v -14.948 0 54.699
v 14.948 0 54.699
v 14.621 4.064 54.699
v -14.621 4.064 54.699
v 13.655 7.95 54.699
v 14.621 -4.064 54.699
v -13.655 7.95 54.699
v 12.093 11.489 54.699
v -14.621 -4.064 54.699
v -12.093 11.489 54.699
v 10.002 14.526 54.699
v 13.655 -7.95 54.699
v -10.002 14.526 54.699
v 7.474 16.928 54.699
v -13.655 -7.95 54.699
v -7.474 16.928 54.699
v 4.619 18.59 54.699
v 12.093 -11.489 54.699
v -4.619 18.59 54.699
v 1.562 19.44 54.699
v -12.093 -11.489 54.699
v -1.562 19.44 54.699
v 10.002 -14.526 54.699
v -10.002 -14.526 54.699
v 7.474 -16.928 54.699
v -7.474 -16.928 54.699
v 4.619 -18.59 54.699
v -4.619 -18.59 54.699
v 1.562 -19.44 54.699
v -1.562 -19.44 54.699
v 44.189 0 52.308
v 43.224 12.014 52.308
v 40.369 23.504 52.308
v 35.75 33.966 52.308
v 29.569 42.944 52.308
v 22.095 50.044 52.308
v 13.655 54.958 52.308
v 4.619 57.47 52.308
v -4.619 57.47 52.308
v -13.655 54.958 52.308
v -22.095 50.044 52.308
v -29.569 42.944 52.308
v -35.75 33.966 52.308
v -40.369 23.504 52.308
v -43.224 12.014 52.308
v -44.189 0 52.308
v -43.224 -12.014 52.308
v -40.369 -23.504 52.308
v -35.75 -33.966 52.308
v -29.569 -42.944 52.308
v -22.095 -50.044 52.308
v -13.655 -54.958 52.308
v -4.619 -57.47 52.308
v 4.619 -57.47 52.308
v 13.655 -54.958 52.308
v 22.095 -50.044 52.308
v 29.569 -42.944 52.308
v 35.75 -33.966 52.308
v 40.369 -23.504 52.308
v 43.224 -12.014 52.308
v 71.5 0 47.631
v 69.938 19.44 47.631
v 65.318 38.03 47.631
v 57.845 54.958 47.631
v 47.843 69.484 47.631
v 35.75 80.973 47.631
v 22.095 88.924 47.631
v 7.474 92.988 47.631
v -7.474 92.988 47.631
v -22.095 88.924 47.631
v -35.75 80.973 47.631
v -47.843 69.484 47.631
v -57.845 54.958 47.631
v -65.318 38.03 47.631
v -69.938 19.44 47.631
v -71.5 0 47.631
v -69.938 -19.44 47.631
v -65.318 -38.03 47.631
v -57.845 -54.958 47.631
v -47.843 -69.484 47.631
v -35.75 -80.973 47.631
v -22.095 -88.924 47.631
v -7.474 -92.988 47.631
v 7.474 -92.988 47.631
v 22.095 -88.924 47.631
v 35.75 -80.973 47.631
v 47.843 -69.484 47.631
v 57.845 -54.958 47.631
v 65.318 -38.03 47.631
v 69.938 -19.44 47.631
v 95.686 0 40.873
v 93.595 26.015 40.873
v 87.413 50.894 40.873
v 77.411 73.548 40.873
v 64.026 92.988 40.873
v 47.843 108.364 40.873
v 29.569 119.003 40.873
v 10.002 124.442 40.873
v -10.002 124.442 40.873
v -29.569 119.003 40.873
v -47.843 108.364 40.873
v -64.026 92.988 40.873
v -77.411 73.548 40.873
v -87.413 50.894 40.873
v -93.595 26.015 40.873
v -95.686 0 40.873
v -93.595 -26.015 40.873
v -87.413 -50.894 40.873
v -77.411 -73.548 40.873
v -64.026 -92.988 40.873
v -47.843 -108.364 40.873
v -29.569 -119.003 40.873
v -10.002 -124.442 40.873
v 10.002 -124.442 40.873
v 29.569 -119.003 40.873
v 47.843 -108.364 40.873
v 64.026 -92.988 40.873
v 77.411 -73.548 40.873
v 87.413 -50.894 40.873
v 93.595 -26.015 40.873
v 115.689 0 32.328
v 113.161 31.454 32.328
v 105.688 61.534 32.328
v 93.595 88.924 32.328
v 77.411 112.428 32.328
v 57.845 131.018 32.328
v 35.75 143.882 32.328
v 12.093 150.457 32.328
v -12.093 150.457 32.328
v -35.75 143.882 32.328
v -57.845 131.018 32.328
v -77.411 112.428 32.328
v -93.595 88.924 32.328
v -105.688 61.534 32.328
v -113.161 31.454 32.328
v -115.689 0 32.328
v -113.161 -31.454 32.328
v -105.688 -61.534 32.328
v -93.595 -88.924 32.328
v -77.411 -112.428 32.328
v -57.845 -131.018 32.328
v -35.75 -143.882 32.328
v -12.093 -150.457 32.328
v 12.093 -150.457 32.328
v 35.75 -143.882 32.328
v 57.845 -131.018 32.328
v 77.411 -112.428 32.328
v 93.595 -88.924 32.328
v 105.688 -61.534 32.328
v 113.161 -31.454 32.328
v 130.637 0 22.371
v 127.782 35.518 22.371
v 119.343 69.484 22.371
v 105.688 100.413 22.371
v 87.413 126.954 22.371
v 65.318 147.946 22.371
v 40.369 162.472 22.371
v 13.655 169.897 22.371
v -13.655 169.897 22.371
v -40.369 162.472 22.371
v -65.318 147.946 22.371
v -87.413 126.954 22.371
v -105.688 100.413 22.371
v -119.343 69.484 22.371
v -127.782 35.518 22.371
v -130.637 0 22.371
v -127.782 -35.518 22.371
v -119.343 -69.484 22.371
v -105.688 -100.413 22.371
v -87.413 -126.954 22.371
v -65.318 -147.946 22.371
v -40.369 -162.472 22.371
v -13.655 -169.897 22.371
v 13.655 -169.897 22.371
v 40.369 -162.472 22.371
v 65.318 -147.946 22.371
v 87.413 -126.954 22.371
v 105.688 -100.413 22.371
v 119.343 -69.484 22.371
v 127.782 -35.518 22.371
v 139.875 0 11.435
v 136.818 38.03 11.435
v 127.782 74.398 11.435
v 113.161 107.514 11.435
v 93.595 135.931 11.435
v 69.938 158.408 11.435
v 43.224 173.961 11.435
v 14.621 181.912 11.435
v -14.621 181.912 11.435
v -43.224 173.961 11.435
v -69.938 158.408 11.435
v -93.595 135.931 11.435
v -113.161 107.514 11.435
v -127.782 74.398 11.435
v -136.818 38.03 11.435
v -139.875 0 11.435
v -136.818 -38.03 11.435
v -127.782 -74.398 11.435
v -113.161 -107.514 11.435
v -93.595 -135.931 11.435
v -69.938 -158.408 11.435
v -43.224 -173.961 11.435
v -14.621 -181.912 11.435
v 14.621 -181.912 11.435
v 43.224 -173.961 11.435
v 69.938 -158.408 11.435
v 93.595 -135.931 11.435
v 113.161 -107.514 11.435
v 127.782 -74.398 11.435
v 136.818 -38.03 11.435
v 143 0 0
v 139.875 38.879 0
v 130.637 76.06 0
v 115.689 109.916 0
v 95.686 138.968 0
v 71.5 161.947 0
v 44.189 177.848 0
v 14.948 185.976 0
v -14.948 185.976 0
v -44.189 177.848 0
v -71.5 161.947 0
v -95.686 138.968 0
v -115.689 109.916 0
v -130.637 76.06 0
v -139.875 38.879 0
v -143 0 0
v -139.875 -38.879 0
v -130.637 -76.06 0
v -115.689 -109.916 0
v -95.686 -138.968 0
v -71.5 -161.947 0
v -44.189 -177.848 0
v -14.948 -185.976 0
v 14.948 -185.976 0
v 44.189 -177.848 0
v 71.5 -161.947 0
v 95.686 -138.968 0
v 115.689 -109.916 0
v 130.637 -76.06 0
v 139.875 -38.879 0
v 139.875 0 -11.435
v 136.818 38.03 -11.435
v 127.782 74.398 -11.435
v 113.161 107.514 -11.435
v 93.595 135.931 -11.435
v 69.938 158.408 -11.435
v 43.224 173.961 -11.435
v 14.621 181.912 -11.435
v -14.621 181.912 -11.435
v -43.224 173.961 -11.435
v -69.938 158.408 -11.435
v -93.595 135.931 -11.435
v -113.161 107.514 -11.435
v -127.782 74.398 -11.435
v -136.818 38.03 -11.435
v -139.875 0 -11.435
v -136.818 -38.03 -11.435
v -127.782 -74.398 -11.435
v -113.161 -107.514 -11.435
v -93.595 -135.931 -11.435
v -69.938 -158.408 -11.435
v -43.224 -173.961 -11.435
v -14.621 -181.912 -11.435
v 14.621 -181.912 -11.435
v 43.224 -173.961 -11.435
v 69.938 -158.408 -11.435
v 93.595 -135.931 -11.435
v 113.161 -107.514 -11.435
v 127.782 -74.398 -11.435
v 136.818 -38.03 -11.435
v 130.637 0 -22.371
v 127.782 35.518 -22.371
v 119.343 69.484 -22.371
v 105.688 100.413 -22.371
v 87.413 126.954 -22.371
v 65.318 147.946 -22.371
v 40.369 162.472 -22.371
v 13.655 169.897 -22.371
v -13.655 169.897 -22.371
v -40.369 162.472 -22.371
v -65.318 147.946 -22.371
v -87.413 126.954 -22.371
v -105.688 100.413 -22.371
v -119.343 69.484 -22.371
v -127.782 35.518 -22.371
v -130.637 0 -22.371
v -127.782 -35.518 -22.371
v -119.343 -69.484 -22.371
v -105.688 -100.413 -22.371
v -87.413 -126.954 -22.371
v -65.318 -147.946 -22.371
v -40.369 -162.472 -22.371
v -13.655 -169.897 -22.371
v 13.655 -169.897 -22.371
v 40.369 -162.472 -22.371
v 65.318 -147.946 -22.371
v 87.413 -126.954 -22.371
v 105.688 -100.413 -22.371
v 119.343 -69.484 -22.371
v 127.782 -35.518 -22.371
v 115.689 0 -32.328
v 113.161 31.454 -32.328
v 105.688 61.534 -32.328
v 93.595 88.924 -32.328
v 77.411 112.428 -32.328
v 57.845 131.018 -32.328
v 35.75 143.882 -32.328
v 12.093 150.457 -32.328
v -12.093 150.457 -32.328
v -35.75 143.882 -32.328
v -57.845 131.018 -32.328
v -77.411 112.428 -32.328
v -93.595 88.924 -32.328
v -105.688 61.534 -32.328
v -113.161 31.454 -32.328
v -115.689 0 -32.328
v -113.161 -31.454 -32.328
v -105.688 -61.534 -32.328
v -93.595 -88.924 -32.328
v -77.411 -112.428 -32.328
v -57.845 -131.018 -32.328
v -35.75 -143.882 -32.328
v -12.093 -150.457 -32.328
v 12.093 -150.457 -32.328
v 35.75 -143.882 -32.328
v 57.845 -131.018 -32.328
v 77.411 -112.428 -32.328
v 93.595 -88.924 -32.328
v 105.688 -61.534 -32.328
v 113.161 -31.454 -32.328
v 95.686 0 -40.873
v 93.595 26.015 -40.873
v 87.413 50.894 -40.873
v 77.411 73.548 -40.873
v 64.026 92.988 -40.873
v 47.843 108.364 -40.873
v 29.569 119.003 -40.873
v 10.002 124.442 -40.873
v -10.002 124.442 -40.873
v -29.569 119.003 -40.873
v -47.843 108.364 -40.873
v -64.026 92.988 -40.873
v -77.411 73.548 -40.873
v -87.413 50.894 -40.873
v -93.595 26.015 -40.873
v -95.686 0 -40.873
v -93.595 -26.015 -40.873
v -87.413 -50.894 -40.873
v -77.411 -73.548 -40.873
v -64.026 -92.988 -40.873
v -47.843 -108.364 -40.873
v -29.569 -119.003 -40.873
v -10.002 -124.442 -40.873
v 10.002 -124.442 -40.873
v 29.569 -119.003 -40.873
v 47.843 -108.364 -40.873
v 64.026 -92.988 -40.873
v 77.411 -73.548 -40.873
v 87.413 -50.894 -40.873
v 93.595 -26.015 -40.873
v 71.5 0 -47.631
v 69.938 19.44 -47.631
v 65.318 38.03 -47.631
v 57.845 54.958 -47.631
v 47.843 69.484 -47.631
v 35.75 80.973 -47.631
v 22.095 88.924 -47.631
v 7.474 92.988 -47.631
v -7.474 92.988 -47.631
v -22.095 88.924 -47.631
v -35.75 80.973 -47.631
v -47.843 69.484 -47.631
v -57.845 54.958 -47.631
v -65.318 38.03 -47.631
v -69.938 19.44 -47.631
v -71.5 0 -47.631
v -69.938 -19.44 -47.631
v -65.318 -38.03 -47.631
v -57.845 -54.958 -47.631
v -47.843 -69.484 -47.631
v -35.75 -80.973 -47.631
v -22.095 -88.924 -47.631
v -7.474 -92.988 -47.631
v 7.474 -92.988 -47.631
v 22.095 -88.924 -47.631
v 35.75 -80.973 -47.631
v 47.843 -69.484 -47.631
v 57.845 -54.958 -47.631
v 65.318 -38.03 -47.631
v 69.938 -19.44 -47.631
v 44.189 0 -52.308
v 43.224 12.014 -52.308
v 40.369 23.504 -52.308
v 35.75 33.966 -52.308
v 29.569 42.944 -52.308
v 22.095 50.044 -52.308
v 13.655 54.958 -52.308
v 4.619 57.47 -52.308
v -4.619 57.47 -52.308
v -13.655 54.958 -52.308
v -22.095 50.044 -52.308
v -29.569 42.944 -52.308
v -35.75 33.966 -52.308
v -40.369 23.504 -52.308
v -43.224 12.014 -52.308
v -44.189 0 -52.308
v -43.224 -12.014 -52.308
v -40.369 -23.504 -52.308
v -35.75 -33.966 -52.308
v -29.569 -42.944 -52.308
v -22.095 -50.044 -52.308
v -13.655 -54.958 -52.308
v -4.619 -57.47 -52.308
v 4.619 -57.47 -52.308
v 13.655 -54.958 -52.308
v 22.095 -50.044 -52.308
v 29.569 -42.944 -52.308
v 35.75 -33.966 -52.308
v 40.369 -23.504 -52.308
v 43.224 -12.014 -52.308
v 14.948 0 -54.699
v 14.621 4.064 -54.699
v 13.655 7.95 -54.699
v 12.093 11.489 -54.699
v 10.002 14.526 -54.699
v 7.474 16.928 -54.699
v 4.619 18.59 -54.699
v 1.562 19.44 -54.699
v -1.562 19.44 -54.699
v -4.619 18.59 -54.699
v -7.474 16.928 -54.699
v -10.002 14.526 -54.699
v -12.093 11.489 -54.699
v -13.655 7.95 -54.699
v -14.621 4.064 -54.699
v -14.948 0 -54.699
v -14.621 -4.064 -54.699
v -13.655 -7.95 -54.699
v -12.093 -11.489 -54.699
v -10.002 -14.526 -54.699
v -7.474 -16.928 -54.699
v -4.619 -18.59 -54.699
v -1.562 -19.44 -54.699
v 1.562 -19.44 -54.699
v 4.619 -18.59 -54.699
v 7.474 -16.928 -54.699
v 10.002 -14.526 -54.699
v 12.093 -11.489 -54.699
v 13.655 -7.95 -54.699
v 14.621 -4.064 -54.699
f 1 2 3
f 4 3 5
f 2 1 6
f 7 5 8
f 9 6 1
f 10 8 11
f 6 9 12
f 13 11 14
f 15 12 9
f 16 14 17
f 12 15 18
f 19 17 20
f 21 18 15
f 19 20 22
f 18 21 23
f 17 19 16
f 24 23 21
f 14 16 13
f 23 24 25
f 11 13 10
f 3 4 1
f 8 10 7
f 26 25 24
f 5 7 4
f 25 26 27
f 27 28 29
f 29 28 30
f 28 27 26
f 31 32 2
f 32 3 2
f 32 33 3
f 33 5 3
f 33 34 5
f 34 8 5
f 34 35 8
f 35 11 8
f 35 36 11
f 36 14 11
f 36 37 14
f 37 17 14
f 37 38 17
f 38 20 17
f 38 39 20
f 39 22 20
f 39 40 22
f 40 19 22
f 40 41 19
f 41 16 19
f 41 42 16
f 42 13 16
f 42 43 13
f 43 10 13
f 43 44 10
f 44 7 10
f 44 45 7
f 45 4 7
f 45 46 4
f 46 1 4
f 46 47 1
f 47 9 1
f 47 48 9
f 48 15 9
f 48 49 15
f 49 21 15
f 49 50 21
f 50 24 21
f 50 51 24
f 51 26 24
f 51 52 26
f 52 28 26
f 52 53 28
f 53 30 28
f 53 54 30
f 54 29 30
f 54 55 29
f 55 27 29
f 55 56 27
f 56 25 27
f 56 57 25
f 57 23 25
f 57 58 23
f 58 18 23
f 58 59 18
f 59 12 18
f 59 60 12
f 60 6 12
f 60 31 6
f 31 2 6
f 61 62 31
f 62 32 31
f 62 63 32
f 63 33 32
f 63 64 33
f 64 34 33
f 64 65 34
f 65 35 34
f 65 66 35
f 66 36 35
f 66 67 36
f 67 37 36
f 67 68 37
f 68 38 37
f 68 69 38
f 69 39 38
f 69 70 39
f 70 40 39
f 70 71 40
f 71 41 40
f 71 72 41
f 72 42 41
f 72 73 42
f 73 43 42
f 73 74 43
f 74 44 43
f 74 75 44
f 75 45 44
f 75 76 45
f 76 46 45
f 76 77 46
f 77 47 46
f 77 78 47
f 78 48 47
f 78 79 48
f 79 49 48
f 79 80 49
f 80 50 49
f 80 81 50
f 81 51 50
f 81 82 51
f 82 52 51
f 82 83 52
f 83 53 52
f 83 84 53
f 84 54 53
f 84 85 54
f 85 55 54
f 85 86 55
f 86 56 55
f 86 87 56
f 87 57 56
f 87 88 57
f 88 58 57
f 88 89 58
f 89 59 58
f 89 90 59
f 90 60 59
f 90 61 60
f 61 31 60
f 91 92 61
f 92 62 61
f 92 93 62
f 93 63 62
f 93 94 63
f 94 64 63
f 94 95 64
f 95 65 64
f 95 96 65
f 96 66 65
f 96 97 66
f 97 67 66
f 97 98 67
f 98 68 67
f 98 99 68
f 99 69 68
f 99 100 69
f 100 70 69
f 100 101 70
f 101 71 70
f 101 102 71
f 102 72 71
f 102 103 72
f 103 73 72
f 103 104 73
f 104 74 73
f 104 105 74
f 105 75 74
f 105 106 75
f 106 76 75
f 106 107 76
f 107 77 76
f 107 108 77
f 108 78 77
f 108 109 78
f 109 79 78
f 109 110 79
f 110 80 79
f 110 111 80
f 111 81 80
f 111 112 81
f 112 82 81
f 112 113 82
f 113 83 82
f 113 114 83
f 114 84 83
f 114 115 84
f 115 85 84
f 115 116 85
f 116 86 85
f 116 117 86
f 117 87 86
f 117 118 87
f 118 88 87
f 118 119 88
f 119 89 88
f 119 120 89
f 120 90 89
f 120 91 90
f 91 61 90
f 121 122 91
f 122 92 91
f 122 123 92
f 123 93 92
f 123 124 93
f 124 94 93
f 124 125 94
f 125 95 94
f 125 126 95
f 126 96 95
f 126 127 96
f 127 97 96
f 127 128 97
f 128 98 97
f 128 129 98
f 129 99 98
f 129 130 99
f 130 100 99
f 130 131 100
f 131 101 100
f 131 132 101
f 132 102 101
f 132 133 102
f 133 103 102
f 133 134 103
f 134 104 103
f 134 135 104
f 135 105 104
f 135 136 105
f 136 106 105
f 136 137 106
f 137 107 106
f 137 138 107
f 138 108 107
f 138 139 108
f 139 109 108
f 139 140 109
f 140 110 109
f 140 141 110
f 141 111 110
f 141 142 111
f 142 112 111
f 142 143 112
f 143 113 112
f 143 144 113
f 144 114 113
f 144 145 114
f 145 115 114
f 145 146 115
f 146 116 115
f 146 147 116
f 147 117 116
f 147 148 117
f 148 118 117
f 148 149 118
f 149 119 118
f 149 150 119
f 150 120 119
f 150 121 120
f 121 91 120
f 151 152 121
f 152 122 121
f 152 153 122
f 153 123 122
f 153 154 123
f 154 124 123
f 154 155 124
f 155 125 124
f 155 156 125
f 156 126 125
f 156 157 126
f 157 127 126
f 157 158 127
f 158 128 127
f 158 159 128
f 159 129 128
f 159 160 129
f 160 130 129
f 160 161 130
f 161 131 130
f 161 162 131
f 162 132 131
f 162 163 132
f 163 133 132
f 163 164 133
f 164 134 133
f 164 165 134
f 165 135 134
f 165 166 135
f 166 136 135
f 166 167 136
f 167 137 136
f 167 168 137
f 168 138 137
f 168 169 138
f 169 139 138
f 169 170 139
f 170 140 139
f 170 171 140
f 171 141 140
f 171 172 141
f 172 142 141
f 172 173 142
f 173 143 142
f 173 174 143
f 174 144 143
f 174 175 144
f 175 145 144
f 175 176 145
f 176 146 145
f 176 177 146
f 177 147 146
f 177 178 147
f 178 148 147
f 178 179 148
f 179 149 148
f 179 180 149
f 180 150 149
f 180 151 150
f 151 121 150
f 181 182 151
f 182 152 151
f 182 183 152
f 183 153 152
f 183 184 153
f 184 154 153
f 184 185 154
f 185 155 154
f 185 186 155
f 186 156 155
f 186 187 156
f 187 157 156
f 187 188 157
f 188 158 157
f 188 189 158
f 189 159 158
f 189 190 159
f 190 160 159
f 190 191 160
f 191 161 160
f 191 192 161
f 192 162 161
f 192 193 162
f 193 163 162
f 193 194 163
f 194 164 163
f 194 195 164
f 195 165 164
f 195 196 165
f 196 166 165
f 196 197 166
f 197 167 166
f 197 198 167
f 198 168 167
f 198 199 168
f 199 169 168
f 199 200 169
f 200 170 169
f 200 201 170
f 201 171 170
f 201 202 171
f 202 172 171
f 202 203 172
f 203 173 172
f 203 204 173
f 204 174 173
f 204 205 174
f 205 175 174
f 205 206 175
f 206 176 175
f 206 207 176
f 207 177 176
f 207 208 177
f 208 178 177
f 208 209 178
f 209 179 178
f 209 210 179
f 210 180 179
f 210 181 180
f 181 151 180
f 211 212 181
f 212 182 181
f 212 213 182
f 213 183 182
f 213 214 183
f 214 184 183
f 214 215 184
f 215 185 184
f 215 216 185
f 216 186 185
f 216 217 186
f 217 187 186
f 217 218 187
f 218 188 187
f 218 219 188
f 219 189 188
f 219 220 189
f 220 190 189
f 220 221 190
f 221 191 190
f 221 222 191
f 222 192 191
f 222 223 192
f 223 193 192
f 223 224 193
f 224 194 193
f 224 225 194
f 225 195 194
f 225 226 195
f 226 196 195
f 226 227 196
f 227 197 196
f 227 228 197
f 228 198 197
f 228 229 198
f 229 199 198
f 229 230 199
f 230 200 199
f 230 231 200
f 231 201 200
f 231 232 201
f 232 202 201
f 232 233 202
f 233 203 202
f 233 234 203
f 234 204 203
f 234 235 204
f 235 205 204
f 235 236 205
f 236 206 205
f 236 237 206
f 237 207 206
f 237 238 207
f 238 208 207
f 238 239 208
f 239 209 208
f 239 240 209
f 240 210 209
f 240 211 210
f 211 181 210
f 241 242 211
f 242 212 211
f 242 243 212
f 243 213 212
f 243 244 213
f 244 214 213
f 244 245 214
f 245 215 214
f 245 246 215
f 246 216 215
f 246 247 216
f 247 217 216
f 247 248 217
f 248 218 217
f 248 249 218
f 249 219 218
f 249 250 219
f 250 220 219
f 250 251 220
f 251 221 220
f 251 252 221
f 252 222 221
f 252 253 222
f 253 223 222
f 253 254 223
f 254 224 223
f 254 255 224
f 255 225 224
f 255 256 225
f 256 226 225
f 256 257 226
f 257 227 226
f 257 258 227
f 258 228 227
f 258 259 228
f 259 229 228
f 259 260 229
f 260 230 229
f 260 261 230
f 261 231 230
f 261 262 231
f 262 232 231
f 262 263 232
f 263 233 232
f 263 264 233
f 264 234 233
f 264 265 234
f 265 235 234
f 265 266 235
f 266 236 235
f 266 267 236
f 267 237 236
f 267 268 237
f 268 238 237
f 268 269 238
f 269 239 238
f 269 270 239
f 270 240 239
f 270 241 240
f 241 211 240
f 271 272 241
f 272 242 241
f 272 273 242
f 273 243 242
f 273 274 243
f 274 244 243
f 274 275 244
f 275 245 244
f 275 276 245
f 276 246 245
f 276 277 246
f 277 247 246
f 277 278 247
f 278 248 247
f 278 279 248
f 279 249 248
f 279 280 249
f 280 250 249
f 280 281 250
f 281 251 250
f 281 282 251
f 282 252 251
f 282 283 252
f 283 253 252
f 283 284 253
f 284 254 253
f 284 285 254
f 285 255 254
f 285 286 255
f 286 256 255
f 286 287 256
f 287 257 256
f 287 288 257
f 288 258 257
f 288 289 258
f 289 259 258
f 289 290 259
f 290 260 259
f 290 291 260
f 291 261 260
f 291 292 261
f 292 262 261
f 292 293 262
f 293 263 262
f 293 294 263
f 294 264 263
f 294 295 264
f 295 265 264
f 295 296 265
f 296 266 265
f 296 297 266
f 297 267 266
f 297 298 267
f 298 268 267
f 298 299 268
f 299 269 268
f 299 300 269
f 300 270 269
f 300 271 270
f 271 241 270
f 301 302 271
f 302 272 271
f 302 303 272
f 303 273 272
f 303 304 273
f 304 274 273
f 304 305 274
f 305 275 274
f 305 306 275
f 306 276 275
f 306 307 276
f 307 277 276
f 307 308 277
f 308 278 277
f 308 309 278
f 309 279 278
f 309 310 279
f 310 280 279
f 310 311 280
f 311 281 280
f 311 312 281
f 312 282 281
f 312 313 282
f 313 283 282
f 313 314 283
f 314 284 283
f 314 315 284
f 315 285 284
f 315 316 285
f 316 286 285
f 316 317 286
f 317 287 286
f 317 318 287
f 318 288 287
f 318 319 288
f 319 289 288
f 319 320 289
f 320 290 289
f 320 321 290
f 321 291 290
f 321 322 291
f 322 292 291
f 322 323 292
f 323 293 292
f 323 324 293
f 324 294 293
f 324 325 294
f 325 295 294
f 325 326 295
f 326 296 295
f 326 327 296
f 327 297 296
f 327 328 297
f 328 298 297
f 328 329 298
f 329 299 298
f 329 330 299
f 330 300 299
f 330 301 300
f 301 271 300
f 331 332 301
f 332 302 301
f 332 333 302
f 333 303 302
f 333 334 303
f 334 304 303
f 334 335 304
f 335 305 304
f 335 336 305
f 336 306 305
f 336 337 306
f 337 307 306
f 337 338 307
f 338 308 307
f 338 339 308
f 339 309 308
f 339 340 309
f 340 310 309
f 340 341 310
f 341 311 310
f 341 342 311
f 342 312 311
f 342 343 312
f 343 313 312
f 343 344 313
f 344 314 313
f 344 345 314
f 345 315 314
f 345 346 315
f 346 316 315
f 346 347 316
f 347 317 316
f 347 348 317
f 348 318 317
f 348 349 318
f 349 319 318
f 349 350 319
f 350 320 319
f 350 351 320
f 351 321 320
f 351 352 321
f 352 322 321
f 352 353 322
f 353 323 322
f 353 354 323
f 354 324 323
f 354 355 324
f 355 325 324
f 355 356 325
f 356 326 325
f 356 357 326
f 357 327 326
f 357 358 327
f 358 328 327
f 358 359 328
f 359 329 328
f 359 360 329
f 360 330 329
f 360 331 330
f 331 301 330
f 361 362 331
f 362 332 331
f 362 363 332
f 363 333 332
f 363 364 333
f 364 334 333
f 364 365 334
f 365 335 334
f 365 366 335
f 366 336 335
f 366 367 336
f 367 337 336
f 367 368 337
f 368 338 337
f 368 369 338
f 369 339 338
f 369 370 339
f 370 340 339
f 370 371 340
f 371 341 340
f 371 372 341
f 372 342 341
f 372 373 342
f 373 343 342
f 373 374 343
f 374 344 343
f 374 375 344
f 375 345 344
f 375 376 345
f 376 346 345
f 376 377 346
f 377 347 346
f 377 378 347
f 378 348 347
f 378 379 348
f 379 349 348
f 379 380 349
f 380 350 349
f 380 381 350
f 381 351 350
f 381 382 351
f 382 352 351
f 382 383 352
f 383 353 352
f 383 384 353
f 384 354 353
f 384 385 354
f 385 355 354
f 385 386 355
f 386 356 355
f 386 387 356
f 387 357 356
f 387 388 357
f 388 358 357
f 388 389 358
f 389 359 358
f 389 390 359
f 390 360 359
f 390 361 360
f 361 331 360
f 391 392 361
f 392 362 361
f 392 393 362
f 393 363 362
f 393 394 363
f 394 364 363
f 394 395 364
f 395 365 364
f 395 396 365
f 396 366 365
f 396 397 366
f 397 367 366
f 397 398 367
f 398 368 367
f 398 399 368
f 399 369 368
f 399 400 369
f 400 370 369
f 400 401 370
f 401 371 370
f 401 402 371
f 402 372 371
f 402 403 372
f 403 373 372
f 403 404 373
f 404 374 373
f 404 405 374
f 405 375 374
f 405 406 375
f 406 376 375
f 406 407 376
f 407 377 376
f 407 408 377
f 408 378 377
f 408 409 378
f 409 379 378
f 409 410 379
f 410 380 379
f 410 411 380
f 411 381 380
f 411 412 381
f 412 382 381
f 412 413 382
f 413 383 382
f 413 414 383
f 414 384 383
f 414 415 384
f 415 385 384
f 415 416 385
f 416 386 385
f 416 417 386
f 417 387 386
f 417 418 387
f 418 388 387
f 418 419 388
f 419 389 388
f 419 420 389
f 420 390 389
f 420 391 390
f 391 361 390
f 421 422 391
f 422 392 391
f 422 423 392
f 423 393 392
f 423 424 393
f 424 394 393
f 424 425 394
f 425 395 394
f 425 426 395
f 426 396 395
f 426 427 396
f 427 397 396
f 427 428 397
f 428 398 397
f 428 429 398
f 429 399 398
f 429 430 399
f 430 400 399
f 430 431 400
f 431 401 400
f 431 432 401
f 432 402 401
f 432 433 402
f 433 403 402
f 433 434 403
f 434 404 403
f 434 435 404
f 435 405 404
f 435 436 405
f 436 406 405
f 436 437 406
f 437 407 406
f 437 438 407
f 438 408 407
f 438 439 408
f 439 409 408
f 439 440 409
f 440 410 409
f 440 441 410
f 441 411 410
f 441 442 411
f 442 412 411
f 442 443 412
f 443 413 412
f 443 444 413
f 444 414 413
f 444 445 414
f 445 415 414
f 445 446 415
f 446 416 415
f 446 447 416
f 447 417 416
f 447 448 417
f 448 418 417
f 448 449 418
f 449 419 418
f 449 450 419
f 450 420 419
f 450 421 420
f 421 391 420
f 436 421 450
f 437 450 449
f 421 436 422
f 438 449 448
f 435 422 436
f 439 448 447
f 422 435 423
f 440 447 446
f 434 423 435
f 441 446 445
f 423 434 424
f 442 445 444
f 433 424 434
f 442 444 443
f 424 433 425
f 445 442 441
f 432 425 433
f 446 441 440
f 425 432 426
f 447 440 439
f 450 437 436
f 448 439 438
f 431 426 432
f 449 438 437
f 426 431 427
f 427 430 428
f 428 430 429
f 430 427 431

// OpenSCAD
// Generated by SolidPython 1.0.1 on 2020-07-29 00:46:51


scale(v = [13, 17, 5]) {
	sphere(r = 11);
}
/***********************************************
*********      SolidPython code:      **********
************************************************
 
# import packages: SolidPython
from solid import *
from solid.utils import *
from itertools import chain, combinations, permutations


class Resize:

    def __init__(self, scad_file):
        self.scad_file = scad_file
        #self.scad_file = import_scad(scad_file)
        # cone/cylinder param:
        self.r1 = 0
        self.r2 = 0
        self.h = 0
        # rectangular prism param:
        self.w = 0
        self.l = 0
        # ellipse param:
        self.r = 0

    # import OpenScad code (file name corresponds to shape)


    # classify shape + parameters
    def assign(self, param1, param2, param3):
        if self.scad_file == 'cone.scad':
            self.r1 = param1
            self.r2 = param2
            self.h = param3
        elif self.scad_file == 'cylinder.scad':
            self.r1 = param1
            self.r2 = param2
            self.h = param3
        elif self.scad_file == 'rectangularPrism.scad':
            self.h = param1
            self.l = param2
            self.w = param3
        else:
            self.r = param1
            self.h = param2

    # resize parameters
    def iterate(self):
        x = range(3, 20, 2)
        i = 1
        if self.scad_file == 'cone.scad':
            tempList = list(permutations(x, 2))
            for temp in tempList:
                param1 = temp[0]
                param2 = temp[1]
                filepath = 'produced_scad_files/' + 'cone' + str(param1) + '_' + str(param2) + '_' + '.scad'
                scad_render_to_file(cylinder(h=param1, r1=param2, r2=0), filepath)

        elif self.scad_file == 'cylinder.scad':
            tempList = list(permutations(x, 3))
            for temp in tempList:
                param1 = temp[0]
                param2 = temp[1]
                filepath = 'produced_scad_files/' + 'cylinder' + str(param1) + '_' + str(param2) + '_' + '.scad'
                scad_render_to_file(cylinder(h=param1, r1=param2, r2=param2), filepath)

        elif self.scad_file == 'rectangularPrism.scad':
            tempList = list(permutations(x, 3))
            for temp in tempList:
                param1 = temp[0]
                param2 = temp[1]
                param3 = temp[2]
                filepath = 'produced_scad_files/' + 'rectangularPrism' + str(param1) + '_' + str(param2) + '_' + str(
                    param3) + '.scad'
                scad_render_to_file(cube(size=(param1, param2, param3)), filepath)

        elif self.scad_file == 'ellipse.scad':
            tempList = list(permutations(x, 4))
            for temp in tempList:
                param1 = temp[0]
                param2 = temp[1]
                param3 = temp[2]
                param4 = temp[3]
                filepath = 'produced_scad_files/' + 'ellipse' + str(param1) + '_' + str(param2) + '_' + str(param3) + '_' + str(param4) + '.scad'
                scad_render_to_file(scale([param1, param2, param3])(sphere(r=param4)), filepath)

    def render_to_scadfile(self):
        scad_render_to_file(scad, 'example.scad') 
 
************************************************/
